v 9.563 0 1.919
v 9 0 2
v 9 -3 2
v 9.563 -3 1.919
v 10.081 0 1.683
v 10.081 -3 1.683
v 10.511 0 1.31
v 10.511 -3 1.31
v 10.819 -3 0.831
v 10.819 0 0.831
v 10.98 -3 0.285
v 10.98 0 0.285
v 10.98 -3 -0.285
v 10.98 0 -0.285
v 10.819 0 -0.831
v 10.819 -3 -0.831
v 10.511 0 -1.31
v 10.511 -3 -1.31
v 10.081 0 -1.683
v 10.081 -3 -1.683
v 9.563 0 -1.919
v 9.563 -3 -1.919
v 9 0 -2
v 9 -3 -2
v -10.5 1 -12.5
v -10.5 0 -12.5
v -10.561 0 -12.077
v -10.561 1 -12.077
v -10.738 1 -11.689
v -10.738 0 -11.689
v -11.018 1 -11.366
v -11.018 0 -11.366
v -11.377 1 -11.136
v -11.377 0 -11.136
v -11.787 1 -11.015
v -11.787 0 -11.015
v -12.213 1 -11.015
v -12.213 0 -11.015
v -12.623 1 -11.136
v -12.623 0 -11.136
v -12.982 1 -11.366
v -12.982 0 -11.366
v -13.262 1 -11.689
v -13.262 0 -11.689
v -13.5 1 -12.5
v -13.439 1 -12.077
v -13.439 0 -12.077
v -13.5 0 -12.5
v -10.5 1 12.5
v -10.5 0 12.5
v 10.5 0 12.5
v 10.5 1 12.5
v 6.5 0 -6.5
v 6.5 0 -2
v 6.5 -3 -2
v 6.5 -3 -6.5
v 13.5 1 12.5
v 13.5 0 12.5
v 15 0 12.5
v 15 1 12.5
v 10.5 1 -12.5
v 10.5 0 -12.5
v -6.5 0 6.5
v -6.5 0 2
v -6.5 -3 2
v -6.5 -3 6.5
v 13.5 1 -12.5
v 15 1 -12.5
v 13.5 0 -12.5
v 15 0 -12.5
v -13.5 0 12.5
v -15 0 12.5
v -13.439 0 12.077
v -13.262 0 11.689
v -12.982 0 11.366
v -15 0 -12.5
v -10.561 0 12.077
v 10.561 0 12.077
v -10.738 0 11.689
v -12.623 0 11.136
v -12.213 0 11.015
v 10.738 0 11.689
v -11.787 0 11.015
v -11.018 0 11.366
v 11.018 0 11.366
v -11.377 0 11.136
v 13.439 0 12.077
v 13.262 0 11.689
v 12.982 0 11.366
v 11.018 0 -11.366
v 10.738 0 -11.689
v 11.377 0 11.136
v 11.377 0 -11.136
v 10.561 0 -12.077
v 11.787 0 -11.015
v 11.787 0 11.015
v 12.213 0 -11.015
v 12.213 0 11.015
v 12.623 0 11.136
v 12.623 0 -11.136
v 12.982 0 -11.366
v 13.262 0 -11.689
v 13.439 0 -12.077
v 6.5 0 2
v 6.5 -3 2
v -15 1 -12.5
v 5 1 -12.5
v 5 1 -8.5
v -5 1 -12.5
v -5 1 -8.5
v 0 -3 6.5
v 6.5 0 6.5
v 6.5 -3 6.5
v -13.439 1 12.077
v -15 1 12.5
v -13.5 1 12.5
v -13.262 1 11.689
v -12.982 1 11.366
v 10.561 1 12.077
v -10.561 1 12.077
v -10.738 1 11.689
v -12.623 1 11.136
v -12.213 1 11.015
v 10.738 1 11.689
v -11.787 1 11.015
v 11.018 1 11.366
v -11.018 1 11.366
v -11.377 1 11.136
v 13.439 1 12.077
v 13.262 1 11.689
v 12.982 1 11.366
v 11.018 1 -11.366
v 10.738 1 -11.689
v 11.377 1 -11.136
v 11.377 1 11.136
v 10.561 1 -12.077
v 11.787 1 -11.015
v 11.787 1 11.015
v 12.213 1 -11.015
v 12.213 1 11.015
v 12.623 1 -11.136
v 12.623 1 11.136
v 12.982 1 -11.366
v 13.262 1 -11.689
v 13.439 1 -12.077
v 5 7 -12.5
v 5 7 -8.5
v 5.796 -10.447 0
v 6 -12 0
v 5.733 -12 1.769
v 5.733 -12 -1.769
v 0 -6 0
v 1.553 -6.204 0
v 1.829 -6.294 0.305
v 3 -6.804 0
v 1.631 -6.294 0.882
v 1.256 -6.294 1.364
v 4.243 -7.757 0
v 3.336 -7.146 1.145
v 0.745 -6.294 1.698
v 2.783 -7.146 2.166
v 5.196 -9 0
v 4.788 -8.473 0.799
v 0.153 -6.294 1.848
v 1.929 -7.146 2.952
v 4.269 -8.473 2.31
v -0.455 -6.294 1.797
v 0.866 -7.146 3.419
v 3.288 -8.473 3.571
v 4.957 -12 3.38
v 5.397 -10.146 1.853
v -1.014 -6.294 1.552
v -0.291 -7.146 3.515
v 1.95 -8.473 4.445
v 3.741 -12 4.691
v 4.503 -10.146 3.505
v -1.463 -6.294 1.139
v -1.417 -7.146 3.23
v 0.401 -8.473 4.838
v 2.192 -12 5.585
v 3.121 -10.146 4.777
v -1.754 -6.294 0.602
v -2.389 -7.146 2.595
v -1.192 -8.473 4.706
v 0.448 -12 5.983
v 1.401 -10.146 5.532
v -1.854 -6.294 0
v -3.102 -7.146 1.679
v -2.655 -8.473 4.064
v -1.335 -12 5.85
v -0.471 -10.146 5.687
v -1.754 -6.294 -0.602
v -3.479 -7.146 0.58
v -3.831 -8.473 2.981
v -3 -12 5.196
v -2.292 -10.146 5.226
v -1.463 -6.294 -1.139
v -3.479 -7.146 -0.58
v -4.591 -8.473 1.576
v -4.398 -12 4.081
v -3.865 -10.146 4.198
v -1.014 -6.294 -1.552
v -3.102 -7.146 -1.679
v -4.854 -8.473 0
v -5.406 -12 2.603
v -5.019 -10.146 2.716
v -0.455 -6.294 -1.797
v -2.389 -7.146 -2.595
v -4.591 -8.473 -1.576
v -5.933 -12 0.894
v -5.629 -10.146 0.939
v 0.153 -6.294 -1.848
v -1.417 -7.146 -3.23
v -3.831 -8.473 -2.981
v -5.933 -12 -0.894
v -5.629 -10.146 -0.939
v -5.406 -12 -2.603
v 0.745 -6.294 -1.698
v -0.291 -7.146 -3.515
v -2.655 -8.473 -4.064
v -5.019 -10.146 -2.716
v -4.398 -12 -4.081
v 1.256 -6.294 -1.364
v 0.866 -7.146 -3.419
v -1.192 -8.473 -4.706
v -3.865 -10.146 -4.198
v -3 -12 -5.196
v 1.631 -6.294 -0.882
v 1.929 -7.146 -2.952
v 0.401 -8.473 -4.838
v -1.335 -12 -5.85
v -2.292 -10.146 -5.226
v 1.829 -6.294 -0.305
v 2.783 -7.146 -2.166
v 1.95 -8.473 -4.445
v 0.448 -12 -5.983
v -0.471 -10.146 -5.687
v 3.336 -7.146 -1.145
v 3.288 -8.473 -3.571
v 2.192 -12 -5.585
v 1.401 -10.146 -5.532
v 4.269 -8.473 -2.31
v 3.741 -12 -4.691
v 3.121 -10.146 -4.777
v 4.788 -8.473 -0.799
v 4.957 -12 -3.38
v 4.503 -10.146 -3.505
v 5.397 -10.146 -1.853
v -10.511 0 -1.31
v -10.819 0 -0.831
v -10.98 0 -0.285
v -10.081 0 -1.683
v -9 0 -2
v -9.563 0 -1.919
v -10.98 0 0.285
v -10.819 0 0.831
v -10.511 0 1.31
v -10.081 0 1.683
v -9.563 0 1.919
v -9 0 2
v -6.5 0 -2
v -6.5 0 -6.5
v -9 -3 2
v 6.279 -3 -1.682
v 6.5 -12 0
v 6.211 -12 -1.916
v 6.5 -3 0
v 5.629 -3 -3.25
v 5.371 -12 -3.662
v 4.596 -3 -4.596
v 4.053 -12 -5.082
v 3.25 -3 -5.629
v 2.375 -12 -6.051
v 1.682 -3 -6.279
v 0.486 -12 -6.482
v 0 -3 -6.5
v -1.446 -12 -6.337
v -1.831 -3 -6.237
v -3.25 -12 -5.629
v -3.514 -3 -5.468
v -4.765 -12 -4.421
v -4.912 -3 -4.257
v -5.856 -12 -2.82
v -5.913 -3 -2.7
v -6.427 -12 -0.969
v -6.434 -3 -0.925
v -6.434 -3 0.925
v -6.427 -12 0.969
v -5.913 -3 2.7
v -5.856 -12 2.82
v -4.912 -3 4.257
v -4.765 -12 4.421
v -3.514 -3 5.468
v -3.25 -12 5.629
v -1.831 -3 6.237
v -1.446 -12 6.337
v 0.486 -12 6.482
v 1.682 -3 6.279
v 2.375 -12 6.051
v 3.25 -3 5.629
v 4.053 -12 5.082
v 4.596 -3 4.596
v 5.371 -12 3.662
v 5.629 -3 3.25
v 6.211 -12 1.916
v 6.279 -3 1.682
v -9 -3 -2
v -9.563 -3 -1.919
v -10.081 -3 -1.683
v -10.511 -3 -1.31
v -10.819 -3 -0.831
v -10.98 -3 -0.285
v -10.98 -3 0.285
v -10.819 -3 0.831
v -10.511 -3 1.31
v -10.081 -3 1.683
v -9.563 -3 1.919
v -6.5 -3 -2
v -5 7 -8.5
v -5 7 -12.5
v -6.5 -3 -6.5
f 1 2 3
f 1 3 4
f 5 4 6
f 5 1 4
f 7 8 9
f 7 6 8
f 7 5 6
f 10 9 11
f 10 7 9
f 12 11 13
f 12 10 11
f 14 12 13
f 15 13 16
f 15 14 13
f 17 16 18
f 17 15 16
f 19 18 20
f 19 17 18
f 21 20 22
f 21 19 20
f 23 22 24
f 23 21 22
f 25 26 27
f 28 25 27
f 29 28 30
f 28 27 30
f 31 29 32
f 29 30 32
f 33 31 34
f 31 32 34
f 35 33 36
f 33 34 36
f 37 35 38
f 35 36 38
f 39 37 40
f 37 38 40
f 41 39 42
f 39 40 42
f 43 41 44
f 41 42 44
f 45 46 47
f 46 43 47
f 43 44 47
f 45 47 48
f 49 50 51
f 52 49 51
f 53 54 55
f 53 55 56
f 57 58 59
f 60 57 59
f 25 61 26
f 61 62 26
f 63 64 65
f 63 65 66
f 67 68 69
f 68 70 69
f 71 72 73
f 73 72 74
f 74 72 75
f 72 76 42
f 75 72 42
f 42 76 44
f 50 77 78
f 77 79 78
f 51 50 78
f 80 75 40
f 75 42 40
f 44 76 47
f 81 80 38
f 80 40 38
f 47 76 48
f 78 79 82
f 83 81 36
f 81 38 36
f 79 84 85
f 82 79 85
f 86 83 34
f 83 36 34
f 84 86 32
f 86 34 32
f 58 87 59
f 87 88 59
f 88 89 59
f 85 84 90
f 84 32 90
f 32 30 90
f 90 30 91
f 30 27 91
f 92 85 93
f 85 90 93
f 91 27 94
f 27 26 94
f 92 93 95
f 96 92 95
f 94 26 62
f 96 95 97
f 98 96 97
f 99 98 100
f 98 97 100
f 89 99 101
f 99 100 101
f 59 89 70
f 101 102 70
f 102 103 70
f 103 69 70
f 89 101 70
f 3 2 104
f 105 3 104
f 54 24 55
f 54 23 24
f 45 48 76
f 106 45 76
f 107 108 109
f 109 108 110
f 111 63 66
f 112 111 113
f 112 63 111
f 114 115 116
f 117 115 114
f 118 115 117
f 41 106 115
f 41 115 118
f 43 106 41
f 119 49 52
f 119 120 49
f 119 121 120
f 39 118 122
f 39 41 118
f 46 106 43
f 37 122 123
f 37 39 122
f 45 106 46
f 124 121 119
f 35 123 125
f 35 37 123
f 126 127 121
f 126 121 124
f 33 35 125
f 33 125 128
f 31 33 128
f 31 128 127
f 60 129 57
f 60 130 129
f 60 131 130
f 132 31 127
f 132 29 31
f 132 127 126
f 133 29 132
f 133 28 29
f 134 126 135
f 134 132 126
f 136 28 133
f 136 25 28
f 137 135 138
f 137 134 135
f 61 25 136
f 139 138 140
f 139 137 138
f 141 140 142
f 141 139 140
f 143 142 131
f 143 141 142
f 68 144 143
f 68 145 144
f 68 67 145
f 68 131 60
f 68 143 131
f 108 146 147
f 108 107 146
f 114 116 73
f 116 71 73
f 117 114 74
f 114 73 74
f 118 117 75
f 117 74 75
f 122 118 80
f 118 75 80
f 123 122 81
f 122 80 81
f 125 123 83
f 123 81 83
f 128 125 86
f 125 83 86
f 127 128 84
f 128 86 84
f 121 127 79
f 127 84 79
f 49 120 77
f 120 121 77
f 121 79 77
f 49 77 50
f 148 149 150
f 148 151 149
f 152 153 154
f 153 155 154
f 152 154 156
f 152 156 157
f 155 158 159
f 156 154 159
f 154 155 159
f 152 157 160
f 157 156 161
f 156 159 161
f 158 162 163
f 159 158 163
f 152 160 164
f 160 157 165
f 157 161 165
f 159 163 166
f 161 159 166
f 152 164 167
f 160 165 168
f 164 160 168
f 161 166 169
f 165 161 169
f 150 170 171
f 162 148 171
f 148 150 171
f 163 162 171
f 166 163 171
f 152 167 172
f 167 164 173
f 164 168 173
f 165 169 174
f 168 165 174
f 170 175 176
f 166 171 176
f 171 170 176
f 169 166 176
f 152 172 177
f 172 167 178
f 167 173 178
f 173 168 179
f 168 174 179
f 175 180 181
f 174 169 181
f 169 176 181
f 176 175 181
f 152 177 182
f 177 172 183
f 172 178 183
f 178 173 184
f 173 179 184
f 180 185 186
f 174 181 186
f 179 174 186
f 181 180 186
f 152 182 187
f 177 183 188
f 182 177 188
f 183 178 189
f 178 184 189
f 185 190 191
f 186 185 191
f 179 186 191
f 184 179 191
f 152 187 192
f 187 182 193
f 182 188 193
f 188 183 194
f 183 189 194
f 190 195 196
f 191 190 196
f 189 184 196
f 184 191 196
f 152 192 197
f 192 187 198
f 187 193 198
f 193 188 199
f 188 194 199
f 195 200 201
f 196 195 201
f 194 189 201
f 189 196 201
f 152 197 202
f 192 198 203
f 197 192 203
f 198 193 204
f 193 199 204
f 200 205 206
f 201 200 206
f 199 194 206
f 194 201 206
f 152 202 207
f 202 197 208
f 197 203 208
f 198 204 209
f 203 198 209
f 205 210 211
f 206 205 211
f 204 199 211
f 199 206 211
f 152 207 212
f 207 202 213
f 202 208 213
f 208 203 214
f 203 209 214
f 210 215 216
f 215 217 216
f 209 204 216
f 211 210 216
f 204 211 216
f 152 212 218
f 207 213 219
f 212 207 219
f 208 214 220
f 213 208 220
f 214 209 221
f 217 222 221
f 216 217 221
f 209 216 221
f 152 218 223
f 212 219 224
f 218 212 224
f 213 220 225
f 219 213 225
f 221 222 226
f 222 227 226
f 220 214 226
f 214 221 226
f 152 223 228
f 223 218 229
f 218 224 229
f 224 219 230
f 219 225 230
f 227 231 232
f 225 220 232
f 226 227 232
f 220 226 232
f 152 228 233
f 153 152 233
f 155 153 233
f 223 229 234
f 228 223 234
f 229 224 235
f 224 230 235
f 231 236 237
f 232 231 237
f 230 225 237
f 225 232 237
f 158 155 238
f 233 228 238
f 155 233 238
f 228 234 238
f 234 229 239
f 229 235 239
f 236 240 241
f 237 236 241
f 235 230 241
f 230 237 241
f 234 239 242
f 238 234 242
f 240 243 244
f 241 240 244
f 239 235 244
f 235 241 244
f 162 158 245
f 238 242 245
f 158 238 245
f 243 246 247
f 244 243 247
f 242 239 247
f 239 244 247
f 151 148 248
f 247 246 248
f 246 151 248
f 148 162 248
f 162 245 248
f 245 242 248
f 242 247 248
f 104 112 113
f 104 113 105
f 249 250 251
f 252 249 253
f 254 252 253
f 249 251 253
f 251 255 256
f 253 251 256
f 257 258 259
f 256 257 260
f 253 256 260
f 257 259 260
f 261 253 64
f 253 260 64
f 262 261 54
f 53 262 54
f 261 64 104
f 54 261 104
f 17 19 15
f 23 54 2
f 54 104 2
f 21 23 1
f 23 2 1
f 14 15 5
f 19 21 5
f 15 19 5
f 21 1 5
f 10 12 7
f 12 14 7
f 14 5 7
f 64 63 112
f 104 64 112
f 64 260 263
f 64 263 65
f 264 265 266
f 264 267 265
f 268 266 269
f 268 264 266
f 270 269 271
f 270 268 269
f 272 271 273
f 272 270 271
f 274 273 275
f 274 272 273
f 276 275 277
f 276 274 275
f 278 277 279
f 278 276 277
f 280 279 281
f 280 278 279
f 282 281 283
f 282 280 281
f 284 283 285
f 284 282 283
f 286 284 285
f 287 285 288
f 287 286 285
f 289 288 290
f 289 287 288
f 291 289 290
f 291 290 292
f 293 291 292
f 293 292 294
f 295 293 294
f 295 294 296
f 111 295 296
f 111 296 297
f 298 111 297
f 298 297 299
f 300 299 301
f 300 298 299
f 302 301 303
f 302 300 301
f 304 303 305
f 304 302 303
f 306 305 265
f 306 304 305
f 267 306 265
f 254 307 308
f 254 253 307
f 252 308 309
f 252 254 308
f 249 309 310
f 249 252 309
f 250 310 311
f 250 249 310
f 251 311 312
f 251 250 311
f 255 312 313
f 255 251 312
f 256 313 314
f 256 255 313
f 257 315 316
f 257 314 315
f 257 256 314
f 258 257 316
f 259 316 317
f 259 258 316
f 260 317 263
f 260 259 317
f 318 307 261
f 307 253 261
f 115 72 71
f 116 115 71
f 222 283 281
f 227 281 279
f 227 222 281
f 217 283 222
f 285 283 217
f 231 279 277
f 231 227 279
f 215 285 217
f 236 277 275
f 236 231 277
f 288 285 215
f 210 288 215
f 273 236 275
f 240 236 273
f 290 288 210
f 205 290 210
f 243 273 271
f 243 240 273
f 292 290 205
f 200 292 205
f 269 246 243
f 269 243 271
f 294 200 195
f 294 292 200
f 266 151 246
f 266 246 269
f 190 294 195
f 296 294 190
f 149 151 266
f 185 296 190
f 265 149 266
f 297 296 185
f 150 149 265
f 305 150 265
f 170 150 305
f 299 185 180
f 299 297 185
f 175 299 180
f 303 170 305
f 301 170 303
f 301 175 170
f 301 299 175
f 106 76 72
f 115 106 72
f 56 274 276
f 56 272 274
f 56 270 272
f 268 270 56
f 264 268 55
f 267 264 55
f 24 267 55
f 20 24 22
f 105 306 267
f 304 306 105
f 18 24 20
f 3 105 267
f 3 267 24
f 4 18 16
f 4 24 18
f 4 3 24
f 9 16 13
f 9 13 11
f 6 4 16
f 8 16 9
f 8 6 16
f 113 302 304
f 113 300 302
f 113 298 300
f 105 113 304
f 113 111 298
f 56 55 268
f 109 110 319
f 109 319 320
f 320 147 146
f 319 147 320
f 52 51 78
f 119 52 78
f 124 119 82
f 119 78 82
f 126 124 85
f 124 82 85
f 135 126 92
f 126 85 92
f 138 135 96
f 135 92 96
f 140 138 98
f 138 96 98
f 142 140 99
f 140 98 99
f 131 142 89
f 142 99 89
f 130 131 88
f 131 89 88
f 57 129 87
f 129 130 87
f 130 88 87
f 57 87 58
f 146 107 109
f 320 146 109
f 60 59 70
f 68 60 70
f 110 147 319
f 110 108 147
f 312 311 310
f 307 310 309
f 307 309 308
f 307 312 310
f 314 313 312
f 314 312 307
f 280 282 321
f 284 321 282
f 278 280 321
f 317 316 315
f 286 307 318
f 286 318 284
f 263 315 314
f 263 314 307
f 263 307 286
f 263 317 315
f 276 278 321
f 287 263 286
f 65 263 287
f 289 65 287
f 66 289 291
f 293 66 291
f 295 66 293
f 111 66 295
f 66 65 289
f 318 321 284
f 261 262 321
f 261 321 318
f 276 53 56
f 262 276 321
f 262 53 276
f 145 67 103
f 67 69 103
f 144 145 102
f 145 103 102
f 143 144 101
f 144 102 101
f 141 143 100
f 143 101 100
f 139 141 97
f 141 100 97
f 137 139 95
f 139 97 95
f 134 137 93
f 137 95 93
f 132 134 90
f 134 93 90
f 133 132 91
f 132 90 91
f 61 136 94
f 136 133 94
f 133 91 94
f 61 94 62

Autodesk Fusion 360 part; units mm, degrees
sketch "草图1" plane through (0, 0, 0) normal (0, 1, 0) x (1, 0, 0)
  line L0 (15, 12.5) -> (-15, 12.5)
  line L1 (-15, 12.5) -> (-15, -12.5)
  line L2 (-15, -12.5) -> (15, -12.5)
  line L3 (15, -12.5) -> (15, 12.5)
  line L4 (15, 12.5) -> (-15, -12.5) construction
  line L5 (-15, 12.5) -> (15, -12.5) construction
  line L6 (-18, 0) -> (20, 0)
  line L7 (0, -18) -> (0, 24)
  circle A0 centre (-12, -12.5) radius 1.5
  circle A1 centre (12, -12.5) radius 1.5
  circle A2 centre (-12, 12.5) radius 1.5
  circle A3 centre (12, 12.5) radius 1.5
  dimension "d1" = 30
  dimension "d2" = 25
  dimension "d3" = 3
  dimension "d4" = 24
  dimension "d5" = 25
extrude "拉伸1" add sketch "草图1" along normal blind 1 contours L0 L3 L6 L7 A3 | L2 L3 L6 L7 A1 | L1 L2 L6 L7 A0 | L0 L1 L6 L7 A2 makes body 1
sketch "草图2" plane through (0, 0, 0) normal (0, -1, 0) x (1, 0, 0)
  line L0 (15, 12.5) -> (13.5, 12.5)
  arc A0 (10.5, 12.5) -> (13.5, 12.5) centre (12, 12.5) ccw
  line L1 (10.5, 12.5) -> (-10.5, 12.5)
  arc A1 (-13.5, 12.5) -> (-10.5, 12.5) centre (-12, 12.5) ccw
  line L2 (-13.5, 12.5) -> (-15, 12.5)
  line L3 (-15, 12.5) -> (-15, -12.5)
  line L4 (-15, -12.5) -> (-13.5, -12.5)
  arc A2 (-10.5, -12.5) -> (-13.5, -12.5) centre (-12, -12.5) ccw
  line L5 (-10.5, -12.5) -> (10.5, -12.5)
  arc A3 (13.5, -12.5) -> (10.5, -12.5) centre (12, -12.5) ccw
  line L6 (13.5, -12.5) -> (15, -12.5)
  line L7 (15, -12.5) -> (15, 12.5)
  line L8 (6.5, -6.5) -> (-6.5, -6.5)
  line L9 (-6.5, -6.5) -> (-6.5, 6.5)
  line L10 (-6.5, 6.5) -> (6.5, 6.5)
  line L11 (6.5, 6.5) -> (6.5, -6.5)
  line L12 (6.5, -6.5) -> (-6.5, 6.5) construction
  line L13 (-6.5, -6.5) -> (6.5, 6.5) construction
  circle A4 centre (-9, 0) radius 2
  line L14 (0, 13.0883) -> (0, -18)
  circle A5 centre (9, 0) radius 2
  line L15 (-9, 2) -> (-6.5, 2)
  line L16 (-9, -2) -> (-6.5, -2)
  line L17 (9, 2) -> (6.5, 2)
  line L18 (9, -2) -> (6.5, -2)
  dimension "d8" = 13
  dimension "d9" = 13
  dimension "d10" = 4
  dimension "d11" = 18
extrude "拉伸2" add sketch "草图2" along normal blind 3 separate body contours L8 L9 L10 L14 | L8 L10 L11 L14 | L9 A4 L15 L16 | L11 A5 L17 L18 | A4 | A5 makes body 2
sketch "草图3" plane through (0, -3, 0) normal (0, -1, 0) x (1, 0, 0)
  line L0 (9, 2) -> (6.5, 2)
  line L1 (6.5, 2) -> (6.5, 6.5)
  line L2 (6.5, 6.5) -> (-6.5, 6.5)
  line L3 (-6.5, 6.5) -> (-6.5, 2)
  line L4 (-6.5, 2) -> (-9, 2)
  arc A0 (-9, 2) -> (-9, -2) centre (-9, 0) ccw
  line L5 (-9, -2) -> (-6.5, -2)
  line L6 (-6.5, -2) -> (-6.5, -6.5)
  line L7 (-6.5, -6.5) -> (6.5, -6.5)
  line L8 (6.5, -6.5) -> (6.5, -2)
  line L9 (6.5, -2) -> (9, -2)
  arc A1 (9, -2) -> (9, 2) centre (9, 0) ccw
  circle A2 centre (0, 0) radius 6.5
  dimension "d14" = 13
extrude "拉伸3" add sketch "草图3" along normal blind 9 contours A2 bodies 2
sphere "球体基本要素1" cut diameter 12 placed x (1, 0, 0) y (0, 0, 1) z (0, -1, 0) at (0, -12, 0) bodies 2
sketch "草图6" plane through (0, 1, 0) normal (0, 1, 0) x (-1, 0, 0)
  line L0 (-13.5, 12.5) -> (-15, 12.5)
  line L1 (-15, 12.5) -> (-15, -12.5)
  line L2 (-15, -12.5) -> (-13.5, -12.5)
  arc A0 (-10.5, -12.5) -> (-13.5, -12.5) centre (-12, -12.5) ccw
  line L3 (-10.5, -12.5) -> (10.5, -12.5)
  arc A1 (13.5, -12.5) -> (10.5, -12.5) centre (12, -12.5) ccw
  line L4 (13.5, -12.5) -> (15, -12.5)
  line L5 (15, -12.5) -> (15, 12.5)
  line L6 (15, 12.5) -> (13.5, 12.5)
  arc A2 (10.5, 12.5) -> (13.5, 12.5) centre (12, 12.5) ccw
  line L7 (10.5, 12.5) -> (-10.5, 12.5)
  arc A3 (-13.5, 12.5) -> (-10.5, 12.5) centre (-12, 12.5) ccw
  line L8 (-5, -8.5) -> (5, -8.5)
  line L9 (5, -8.5) -> (5, -12.5)
  line L10 (5, -12.5) -> (-5, -12.5)
  line L11 (-5, -12.5) -> (-5, -8.5)
  line L12 (0, 1) -> (0, -20)
  dimension "d18" = 10
  dimension "d19" = 4
extrude "拉伸4" add sketch "草图6" along normal blind 6 separate body contours L3 L8 L10 L11 L12 | L3 L8 L9 L10 L12 makes body 3
